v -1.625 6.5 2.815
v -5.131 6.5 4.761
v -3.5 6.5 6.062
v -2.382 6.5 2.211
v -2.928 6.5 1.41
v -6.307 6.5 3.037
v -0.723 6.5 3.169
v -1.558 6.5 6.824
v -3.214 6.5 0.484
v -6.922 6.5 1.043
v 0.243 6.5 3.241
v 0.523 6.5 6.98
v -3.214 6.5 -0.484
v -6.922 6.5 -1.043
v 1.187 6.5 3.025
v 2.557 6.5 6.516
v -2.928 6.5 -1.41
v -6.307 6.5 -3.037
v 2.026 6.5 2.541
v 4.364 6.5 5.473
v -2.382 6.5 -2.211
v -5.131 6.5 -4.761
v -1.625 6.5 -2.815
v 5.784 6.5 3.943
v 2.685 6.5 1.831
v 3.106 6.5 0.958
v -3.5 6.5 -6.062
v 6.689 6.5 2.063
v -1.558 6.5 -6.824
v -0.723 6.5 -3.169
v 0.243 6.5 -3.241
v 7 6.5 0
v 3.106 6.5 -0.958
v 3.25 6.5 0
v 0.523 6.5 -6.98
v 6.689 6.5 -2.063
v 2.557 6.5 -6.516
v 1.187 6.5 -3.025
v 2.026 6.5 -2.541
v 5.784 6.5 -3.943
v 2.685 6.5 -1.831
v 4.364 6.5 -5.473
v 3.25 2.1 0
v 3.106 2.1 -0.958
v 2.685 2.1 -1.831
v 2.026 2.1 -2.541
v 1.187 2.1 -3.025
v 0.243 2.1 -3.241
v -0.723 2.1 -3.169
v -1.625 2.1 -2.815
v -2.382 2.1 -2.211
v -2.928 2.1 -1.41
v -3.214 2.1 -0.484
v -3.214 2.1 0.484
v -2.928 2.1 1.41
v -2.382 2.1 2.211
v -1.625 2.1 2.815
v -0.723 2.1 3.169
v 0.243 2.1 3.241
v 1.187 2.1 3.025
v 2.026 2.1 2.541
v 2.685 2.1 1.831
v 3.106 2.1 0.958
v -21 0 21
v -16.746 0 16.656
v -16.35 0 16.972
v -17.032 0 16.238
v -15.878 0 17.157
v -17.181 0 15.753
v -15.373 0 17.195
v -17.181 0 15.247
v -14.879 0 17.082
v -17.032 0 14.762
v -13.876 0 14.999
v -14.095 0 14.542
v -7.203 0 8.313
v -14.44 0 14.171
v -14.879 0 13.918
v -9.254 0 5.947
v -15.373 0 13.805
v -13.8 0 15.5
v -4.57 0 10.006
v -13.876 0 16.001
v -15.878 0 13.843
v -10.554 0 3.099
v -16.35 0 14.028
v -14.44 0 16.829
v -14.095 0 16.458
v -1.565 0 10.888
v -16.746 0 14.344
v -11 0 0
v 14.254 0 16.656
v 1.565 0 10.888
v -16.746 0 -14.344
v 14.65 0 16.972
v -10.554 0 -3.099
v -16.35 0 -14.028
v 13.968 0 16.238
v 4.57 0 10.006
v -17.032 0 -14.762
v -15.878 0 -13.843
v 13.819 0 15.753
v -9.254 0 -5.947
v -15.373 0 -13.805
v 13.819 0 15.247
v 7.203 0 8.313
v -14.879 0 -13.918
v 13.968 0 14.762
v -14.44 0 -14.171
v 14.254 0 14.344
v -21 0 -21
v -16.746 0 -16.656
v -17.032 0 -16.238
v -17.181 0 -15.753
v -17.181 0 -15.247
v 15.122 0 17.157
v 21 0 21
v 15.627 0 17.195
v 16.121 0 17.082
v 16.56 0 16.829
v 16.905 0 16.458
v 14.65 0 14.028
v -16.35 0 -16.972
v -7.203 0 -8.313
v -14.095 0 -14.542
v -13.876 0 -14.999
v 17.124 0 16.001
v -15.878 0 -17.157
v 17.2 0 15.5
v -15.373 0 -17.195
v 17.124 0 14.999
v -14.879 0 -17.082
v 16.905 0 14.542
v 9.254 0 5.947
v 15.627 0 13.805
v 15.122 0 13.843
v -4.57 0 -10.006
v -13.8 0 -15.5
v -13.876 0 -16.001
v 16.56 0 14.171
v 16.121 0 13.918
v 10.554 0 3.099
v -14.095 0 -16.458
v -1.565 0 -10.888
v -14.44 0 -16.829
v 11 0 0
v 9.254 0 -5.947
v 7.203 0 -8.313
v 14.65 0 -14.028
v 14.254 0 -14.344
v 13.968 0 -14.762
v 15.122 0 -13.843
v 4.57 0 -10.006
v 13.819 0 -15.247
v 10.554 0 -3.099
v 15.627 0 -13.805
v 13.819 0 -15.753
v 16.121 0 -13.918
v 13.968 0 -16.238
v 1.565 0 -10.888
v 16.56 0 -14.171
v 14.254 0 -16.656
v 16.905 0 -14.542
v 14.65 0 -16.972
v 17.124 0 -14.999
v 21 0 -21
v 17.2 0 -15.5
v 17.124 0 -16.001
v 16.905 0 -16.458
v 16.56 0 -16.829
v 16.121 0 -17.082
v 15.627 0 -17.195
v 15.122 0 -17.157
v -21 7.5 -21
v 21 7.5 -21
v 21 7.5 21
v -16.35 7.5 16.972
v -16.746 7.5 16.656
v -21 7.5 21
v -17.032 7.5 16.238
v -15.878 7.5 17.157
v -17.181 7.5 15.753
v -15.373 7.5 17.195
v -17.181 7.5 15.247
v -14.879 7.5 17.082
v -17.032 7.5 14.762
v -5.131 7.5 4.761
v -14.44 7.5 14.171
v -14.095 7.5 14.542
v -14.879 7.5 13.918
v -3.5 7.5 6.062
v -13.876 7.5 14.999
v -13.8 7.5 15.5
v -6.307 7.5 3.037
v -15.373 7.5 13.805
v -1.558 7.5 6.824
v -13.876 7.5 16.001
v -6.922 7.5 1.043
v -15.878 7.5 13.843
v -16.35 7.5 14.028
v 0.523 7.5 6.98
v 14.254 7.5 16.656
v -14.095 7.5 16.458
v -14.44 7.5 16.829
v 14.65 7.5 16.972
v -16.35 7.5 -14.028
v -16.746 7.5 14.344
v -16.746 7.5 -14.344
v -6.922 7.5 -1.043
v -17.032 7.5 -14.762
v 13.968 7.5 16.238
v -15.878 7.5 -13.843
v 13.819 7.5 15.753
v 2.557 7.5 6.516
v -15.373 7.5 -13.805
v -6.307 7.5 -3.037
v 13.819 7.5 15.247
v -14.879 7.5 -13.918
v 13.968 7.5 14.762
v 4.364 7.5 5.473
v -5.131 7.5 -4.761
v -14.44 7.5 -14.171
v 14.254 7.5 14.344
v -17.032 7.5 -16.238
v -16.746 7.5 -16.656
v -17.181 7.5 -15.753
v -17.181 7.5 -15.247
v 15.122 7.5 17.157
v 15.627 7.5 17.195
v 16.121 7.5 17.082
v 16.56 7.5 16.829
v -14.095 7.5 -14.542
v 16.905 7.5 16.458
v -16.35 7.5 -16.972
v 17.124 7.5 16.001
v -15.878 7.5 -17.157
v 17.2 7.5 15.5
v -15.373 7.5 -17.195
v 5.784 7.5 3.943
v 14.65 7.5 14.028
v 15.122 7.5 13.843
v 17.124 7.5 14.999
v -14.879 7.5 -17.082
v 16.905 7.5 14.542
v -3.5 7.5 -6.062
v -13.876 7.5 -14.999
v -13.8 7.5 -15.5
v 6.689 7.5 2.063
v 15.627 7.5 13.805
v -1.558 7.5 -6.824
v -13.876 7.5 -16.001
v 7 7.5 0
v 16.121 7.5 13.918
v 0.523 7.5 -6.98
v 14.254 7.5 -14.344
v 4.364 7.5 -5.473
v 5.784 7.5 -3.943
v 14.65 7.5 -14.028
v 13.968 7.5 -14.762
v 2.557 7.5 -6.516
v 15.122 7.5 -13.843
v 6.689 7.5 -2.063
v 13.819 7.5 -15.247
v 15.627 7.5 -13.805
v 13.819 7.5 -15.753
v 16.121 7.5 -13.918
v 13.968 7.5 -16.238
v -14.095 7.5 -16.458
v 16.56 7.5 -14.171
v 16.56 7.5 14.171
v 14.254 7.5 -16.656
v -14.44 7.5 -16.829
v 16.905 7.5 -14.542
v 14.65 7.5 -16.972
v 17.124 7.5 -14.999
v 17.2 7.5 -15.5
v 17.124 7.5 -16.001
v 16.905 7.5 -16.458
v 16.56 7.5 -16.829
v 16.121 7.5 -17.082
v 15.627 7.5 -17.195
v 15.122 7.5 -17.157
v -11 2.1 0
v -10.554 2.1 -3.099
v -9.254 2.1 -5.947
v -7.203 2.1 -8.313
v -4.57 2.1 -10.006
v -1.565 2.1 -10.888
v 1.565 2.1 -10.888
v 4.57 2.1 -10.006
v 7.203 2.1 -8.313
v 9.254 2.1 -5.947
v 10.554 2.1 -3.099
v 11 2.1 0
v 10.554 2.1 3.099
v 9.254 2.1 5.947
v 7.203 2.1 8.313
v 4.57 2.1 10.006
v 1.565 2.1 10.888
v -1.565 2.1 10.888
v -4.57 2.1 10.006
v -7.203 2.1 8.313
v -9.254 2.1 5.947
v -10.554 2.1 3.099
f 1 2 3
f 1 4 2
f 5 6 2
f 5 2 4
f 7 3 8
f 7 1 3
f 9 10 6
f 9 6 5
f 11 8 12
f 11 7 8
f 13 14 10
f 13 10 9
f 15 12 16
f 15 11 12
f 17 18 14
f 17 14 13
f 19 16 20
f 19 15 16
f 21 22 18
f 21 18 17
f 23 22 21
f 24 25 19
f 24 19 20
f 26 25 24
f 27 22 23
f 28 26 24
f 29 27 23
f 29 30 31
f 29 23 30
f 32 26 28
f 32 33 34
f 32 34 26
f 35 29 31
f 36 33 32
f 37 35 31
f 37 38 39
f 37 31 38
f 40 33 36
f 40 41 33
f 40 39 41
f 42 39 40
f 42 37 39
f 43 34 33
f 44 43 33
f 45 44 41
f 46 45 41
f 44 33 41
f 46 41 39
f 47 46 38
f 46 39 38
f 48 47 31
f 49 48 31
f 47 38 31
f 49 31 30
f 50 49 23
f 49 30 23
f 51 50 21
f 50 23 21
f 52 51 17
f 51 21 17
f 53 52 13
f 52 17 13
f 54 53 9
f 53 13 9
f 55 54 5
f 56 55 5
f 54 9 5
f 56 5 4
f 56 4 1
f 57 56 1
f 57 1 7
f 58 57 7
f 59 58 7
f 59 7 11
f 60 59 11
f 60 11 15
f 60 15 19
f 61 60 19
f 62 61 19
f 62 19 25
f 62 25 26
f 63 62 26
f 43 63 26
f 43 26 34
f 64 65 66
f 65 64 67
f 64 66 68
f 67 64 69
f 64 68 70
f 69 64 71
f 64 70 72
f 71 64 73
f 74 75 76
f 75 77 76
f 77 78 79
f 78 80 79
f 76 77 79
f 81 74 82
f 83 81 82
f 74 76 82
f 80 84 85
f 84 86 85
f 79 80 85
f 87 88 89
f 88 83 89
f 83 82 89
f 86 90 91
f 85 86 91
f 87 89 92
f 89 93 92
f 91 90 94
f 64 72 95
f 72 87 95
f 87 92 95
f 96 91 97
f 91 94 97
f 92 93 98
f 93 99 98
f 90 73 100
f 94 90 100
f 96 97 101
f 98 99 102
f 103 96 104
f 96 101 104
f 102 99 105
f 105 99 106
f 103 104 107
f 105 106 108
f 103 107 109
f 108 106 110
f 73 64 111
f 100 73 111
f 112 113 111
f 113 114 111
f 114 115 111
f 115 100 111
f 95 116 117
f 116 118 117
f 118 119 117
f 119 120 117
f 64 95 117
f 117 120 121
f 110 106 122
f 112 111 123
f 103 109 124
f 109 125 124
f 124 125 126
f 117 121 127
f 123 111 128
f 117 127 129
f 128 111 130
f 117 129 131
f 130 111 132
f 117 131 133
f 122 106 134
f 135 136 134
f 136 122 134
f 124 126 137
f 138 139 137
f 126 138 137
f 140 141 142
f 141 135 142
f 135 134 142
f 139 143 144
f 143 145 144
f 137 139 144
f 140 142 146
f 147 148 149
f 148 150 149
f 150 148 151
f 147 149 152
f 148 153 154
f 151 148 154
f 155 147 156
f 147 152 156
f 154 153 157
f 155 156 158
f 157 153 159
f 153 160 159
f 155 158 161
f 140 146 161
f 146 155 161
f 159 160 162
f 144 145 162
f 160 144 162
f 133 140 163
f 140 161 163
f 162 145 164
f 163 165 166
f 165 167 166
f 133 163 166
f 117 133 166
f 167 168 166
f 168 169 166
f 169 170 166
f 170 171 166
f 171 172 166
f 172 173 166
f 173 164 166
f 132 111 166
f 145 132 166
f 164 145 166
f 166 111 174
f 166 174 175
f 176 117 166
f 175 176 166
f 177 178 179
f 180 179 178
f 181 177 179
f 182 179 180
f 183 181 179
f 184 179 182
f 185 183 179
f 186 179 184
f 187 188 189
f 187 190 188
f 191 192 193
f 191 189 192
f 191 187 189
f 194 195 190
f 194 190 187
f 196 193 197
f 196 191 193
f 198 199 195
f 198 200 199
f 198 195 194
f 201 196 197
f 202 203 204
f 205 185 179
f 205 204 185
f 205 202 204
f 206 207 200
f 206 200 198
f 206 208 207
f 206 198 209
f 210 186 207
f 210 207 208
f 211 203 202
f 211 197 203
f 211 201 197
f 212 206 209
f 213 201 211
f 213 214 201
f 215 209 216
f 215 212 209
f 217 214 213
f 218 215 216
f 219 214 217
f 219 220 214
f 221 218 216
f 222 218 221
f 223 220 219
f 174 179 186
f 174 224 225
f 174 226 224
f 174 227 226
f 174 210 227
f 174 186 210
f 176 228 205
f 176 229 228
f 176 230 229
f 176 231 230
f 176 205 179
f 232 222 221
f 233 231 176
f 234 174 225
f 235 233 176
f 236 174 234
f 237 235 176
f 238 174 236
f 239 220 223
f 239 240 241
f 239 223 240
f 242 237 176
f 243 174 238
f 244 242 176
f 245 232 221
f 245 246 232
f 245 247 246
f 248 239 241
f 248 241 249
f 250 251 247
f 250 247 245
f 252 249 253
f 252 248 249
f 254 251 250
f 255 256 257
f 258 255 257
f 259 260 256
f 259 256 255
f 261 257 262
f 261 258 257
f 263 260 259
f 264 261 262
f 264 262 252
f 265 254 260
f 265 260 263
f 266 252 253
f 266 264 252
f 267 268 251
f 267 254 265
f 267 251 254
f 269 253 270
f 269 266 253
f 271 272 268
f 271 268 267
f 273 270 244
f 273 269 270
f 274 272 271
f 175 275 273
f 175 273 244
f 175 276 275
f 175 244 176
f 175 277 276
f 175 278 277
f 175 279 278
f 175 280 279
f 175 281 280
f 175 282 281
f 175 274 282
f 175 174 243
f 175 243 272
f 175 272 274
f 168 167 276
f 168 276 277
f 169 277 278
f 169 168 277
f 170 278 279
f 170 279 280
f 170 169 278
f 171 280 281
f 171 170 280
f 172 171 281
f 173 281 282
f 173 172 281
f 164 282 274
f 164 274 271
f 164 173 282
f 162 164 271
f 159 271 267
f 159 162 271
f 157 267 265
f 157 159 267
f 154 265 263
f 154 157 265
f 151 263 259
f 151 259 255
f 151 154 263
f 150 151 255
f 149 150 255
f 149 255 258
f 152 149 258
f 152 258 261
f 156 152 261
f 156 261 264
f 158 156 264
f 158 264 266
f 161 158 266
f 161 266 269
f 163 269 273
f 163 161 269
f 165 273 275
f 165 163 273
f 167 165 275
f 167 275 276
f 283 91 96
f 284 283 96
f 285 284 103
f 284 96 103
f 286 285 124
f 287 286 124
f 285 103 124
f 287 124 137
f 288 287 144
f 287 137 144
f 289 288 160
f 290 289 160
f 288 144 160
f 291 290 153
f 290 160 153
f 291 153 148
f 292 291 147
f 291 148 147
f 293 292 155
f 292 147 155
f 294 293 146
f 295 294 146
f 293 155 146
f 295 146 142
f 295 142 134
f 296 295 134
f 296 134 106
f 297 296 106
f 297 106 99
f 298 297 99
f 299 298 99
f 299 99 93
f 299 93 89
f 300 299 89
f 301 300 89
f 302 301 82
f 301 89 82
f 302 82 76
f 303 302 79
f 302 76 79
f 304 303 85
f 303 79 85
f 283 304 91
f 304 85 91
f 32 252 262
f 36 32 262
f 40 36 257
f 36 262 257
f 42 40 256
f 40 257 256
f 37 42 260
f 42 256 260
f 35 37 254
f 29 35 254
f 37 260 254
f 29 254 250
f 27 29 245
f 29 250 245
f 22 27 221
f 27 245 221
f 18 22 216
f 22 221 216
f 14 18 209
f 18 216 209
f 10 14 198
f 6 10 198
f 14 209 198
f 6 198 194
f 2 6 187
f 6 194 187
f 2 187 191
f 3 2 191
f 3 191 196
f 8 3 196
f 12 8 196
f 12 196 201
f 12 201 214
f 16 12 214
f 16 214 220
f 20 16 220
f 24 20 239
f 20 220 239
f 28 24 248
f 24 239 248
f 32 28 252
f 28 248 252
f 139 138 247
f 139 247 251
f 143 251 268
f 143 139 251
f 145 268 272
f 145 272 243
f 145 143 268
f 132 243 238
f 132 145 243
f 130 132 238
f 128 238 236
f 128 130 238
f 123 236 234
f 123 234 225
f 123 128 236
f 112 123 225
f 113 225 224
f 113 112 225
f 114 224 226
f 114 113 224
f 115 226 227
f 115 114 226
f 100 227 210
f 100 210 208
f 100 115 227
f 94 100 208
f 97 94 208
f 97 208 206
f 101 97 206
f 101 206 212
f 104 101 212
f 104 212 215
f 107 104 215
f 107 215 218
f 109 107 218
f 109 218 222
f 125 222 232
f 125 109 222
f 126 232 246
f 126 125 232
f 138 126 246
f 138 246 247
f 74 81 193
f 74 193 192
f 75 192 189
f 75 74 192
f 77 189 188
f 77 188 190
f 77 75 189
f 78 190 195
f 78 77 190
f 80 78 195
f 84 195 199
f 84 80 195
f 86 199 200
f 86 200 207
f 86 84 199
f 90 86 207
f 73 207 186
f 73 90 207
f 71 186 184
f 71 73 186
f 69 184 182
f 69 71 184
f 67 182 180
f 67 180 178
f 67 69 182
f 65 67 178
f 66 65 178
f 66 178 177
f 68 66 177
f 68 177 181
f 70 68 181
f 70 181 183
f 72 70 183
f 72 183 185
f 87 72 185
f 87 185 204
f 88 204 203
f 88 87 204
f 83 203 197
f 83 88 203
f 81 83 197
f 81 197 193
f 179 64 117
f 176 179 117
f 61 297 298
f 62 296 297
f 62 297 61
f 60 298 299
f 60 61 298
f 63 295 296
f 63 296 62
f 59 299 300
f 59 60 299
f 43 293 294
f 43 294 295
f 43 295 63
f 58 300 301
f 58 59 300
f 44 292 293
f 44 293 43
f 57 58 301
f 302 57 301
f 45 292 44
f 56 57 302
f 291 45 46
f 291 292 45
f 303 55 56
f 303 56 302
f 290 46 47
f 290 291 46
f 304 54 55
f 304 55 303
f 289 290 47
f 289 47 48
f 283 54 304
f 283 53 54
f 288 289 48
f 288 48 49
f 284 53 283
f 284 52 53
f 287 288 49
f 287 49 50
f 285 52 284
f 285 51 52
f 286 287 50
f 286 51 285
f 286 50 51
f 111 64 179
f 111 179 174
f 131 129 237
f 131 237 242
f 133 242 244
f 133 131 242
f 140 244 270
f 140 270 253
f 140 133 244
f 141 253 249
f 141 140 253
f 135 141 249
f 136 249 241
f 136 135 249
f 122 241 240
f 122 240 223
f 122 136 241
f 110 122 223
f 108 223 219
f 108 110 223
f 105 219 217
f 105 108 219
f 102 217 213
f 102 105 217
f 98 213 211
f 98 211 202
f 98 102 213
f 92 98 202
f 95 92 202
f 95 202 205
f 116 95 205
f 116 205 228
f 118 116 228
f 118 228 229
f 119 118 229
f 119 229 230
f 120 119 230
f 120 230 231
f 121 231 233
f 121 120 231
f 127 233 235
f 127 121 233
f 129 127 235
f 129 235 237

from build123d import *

# Parameters (mm, degrees)
SKETCH1_W           = 42
SKETCH1_H           = 42
SKETCH1_R           = 1.7
BOSS_EXTRUDE1_DEPTH = 7.5
SKETCH2_R           = 11
CUT_EXTRUDE1_DEPTH  = 2.1
SKETCH3_R           = 7
CUT_EXTRUDE2_DEPTH  = 1
SKETCH4_R           = 3.25
CUT_EXTRUDE3_DEPTH  = 10


with BuildPart() as part:
    # Sketch1 → Boss-Extrude1 (new body)
    with BuildSketch(Plane(origin=(0, 0, 0), x_dir=(1, 0, 0), z_dir=(0, 1, 0))):
        Rectangle(SKETCH1_W, SKETCH1_H)
        with Locations((-15.5, 15.5)):
            Circle(SKETCH1_R, mode=Mode.SUBTRACT)
        with Locations((15.5, 15.5)):
            Circle(SKETCH1_R, mode=Mode.SUBTRACT)
        with Locations((15.5, -15.5)):
            Circle(SKETCH1_R, mode=Mode.SUBTRACT)
        with Locations((-15.5, -15.5)):
            Circle(SKETCH1_R, mode=Mode.SUBTRACT)
    extrude(amount=BOSS_EXTRUDE1_DEPTH)

    # Sketch2 → Cut-Extrude1 (cut)
    with BuildSketch(Plane(origin=(0, 0, 0), x_dir=(-1, 0, 0), z_dir=(0, -1, 0))):
        Circle(SKETCH2_R)
    extrude(amount=-CUT_EXTRUDE1_DEPTH, mode=Mode.SUBTRACT)

    # Sketch3 → Cut-Extrude2 (cut)
    with BuildSketch(Plane(origin=(0, 7.5, 0), x_dir=(1, 0, 0), z_dir=(0, 1, 0))):
        Circle(SKETCH3_R)
    extrude(amount=-CUT_EXTRUDE2_DEPTH, mode=Mode.SUBTRACT)

    # Sketch4 → Cut-Extrude3 (cut)
    with BuildSketch(Plane(origin=(0, 6.5, 0), x_dir=(1, 0, 0), z_dir=(0, 1, 0))):
        Circle(SKETCH4_R)
    extrude(amount=-CUT_EXTRUDE3_DEPTH, mode=Mode.SUBTRACT)


solid = part.part
